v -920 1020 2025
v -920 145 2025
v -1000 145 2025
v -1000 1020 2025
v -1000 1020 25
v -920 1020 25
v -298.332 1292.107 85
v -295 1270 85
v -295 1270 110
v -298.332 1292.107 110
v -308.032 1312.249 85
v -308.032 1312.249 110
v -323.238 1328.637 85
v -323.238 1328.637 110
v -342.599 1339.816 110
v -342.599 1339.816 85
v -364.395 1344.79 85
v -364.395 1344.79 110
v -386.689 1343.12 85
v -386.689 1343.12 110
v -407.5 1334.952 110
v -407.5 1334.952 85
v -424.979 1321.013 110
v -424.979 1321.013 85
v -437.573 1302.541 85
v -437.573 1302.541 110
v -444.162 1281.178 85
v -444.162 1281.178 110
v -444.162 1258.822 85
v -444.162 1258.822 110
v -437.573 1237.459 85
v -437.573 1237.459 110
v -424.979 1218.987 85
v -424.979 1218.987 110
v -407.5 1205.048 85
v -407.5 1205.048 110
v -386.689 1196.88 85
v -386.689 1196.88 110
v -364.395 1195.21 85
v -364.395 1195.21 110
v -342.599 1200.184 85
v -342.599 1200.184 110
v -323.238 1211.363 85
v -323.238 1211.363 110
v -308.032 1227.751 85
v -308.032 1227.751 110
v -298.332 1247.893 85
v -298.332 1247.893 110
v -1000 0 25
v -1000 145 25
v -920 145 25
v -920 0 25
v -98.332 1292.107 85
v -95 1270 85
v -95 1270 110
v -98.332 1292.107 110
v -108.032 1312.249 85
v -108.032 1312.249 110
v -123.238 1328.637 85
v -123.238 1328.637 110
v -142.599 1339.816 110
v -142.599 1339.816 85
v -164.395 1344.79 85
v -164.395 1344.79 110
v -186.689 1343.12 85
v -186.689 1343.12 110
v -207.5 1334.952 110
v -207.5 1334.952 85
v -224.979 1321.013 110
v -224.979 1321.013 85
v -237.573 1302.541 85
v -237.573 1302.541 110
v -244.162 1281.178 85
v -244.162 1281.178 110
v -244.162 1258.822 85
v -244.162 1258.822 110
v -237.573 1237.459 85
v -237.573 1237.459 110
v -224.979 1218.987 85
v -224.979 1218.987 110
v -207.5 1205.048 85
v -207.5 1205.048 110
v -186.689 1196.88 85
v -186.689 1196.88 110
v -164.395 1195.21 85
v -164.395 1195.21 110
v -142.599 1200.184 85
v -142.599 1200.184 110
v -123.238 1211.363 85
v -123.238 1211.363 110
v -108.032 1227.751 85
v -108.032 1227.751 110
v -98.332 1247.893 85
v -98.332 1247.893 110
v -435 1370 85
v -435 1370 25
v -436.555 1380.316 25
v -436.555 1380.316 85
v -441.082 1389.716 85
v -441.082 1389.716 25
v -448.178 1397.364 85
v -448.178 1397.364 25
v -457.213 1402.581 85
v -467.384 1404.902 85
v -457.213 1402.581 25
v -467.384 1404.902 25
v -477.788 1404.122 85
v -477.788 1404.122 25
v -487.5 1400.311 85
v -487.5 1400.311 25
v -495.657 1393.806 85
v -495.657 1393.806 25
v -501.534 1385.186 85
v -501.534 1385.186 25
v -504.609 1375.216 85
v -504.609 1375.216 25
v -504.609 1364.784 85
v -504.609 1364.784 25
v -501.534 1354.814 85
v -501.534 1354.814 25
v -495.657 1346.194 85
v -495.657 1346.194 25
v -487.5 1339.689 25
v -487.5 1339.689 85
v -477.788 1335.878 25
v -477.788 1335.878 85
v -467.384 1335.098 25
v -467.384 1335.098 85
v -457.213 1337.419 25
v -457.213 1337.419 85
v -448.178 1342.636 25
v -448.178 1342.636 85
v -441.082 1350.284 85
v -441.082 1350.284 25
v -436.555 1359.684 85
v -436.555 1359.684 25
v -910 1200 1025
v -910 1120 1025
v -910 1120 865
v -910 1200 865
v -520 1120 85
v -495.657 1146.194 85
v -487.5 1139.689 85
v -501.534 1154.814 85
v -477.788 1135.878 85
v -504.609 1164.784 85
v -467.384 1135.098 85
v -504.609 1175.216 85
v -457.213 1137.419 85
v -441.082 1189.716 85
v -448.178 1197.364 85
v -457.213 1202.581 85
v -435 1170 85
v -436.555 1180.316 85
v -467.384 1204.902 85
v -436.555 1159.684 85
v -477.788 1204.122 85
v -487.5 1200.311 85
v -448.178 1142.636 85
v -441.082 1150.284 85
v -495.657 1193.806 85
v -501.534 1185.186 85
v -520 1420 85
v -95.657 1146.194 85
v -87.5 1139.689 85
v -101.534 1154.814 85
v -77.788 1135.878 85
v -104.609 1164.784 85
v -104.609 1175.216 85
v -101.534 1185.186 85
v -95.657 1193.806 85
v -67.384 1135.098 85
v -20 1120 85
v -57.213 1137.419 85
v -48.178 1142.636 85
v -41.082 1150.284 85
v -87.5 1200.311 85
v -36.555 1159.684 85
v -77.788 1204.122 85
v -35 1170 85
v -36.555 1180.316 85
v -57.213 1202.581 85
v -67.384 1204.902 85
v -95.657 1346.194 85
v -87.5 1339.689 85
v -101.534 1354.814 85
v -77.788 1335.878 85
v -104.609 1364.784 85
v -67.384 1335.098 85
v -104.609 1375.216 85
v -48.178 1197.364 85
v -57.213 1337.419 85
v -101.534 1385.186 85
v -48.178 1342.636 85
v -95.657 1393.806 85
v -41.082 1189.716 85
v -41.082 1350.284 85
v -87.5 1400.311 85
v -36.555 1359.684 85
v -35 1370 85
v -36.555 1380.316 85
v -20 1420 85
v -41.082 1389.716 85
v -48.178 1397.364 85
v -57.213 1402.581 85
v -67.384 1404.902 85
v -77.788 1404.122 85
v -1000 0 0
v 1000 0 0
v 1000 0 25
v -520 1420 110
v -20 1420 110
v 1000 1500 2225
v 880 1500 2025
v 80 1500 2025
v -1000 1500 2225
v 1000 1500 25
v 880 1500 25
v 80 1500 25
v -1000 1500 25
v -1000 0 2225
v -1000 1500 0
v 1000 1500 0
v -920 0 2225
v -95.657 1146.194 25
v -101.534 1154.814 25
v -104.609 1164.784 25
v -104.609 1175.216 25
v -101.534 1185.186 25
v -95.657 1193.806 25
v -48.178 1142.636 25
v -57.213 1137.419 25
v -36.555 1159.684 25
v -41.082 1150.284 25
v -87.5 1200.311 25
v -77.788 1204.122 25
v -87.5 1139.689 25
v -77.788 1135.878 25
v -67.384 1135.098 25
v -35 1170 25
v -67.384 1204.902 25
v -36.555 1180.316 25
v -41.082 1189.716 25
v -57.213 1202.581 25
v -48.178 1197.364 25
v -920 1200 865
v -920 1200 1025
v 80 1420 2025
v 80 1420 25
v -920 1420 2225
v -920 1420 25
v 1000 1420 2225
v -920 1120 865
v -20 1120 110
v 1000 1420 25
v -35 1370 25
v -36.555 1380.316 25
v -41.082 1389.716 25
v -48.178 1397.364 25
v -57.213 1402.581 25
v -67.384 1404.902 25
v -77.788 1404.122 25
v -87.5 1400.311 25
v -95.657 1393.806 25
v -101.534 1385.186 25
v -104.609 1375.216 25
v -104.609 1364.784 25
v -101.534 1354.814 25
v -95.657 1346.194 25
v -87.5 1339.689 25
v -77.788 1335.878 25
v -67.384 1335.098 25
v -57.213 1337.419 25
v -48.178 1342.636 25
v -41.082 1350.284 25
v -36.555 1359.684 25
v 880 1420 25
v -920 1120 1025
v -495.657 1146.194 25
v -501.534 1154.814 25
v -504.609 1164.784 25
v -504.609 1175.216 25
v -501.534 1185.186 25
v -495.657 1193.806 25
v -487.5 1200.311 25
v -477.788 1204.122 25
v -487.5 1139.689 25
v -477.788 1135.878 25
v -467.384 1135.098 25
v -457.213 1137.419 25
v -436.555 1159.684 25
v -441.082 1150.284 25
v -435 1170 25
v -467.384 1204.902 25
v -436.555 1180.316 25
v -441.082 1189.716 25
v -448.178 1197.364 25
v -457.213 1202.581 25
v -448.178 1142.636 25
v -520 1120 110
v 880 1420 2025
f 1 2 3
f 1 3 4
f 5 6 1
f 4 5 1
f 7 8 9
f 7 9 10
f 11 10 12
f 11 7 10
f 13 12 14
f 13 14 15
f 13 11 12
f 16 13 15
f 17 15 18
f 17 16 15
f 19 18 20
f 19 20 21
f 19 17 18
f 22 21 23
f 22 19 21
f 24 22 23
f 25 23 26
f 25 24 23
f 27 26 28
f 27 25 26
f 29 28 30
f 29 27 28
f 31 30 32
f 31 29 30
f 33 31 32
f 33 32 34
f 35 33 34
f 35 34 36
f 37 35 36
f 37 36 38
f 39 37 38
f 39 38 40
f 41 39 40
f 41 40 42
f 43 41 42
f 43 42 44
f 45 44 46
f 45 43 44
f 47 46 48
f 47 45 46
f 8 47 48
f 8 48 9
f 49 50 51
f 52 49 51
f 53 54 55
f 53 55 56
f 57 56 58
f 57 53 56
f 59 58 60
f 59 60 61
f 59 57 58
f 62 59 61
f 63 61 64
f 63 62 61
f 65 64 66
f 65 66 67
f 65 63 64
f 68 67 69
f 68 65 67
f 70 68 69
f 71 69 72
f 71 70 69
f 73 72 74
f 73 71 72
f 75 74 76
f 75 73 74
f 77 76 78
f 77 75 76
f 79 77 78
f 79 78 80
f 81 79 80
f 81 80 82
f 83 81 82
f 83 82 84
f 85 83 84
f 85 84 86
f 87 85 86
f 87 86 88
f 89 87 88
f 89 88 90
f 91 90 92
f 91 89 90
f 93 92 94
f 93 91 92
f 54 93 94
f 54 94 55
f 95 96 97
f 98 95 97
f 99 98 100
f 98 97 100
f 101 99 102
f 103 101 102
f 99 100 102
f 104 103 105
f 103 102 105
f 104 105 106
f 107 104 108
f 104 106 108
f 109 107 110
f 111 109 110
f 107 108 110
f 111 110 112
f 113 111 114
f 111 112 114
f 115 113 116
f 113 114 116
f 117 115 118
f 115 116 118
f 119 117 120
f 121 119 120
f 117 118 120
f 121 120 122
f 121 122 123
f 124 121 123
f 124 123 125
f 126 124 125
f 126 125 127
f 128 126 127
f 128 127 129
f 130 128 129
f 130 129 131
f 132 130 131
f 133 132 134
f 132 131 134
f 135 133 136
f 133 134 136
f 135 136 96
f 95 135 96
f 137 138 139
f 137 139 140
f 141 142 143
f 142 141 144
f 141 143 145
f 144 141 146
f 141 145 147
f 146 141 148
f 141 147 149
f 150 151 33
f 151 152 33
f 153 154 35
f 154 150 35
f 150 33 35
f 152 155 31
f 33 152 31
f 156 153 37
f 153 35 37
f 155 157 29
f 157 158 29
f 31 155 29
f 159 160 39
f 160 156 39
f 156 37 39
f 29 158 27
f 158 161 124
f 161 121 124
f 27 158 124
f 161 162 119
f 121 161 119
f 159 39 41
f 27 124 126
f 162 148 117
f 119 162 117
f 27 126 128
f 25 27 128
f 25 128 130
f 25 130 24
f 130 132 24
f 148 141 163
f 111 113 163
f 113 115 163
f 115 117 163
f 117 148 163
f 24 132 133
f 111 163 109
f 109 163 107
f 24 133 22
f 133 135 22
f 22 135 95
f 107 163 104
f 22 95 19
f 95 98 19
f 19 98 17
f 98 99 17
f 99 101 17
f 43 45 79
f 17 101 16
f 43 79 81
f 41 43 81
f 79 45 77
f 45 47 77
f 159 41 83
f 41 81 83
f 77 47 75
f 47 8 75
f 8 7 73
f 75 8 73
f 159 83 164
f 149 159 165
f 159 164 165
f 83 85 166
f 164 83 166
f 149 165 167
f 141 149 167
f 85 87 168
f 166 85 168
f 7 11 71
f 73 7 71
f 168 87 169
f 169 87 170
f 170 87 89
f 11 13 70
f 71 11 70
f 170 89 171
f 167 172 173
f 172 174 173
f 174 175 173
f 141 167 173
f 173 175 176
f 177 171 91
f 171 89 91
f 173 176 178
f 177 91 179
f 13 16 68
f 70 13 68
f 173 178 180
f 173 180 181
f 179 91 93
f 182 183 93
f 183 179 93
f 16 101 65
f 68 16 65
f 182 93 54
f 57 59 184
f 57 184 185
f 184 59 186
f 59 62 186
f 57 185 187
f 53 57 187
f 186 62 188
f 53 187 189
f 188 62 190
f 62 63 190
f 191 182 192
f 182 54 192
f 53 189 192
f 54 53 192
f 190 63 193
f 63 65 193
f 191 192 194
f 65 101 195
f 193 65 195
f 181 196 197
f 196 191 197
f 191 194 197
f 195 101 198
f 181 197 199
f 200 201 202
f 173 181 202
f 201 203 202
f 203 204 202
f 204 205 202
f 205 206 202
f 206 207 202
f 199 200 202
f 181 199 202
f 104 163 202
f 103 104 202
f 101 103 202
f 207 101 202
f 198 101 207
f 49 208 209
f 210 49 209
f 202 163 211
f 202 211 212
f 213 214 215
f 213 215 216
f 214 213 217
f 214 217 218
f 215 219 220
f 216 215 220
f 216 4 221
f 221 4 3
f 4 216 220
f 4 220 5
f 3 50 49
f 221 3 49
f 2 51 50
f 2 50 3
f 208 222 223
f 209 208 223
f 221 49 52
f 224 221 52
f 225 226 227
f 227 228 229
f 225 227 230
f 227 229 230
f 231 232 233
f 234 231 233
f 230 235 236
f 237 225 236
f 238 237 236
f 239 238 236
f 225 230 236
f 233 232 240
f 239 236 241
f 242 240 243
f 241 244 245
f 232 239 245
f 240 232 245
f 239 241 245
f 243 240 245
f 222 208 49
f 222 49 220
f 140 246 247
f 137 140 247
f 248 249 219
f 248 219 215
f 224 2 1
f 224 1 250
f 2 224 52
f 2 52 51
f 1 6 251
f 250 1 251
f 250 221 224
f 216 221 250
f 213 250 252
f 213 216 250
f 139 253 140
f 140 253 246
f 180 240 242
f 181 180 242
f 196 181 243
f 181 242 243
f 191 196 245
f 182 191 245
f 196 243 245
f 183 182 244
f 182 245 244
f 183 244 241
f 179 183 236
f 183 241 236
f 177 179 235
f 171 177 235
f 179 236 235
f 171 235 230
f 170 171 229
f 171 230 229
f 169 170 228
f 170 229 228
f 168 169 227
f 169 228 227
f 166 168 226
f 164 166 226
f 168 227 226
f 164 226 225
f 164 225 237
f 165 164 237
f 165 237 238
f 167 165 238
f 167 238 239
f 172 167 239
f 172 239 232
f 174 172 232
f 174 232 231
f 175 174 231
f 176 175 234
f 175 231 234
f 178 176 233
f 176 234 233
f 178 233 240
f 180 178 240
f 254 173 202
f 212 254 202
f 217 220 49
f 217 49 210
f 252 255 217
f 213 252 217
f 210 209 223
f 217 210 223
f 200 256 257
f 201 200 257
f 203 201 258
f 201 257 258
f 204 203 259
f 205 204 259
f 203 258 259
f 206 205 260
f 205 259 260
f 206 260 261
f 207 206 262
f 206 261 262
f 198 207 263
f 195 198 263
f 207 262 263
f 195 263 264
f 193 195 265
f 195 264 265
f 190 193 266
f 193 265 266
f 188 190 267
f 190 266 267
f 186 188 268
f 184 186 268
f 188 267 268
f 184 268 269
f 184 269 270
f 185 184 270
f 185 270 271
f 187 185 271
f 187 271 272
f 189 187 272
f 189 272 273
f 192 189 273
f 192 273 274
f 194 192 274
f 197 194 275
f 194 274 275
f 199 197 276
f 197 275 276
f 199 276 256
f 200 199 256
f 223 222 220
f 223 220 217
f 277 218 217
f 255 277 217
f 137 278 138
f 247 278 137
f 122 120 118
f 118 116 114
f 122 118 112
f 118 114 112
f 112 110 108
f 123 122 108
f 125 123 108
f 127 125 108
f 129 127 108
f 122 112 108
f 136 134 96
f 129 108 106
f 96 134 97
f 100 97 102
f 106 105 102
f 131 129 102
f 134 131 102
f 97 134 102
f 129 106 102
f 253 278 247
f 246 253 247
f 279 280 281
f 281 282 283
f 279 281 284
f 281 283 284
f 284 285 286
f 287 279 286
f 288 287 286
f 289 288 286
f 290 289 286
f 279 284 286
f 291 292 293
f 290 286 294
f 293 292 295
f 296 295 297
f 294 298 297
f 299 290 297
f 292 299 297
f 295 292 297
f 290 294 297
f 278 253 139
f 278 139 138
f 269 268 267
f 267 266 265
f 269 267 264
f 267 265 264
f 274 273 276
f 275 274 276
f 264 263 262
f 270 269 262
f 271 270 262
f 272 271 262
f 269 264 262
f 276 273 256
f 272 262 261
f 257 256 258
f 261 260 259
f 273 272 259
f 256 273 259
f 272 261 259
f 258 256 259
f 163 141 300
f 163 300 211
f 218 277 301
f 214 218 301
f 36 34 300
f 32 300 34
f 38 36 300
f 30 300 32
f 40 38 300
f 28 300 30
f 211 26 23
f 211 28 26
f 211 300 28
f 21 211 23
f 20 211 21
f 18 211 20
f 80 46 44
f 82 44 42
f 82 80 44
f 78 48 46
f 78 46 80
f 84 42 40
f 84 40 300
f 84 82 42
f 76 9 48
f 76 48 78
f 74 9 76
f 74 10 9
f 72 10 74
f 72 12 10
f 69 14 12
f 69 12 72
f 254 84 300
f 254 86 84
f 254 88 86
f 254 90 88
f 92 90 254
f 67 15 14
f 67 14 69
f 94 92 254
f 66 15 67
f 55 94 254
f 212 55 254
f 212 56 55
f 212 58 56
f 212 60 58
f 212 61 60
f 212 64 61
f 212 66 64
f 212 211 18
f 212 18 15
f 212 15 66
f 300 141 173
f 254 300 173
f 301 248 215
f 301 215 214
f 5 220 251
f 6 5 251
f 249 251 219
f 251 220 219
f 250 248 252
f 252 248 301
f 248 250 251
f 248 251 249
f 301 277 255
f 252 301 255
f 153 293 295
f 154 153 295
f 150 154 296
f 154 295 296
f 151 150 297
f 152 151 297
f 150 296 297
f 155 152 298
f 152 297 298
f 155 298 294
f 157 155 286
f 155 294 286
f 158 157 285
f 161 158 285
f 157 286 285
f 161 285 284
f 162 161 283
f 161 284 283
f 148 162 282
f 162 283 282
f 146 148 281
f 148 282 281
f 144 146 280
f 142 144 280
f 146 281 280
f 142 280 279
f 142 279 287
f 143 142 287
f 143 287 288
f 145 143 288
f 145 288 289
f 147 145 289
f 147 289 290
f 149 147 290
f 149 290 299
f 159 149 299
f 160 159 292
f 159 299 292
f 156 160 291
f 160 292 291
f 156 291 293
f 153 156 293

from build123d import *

# Parameters (mm, degrees)
F0_W      = 2000
F0_H      = 1500
F1_DEPTH  = 25
F3_DEPTH  = 2200
F4_W      = 875
F4_H      = 2000
F5_DEPTH  = 80.001
F6_W      = 800
F6_H      = 2000
F7_DEPTH  = 80.001
F8_R      = 35
F9_DEPTH  = 60
F10_W     = 500
F10_H     = 300
F10_R     = 75
F11_DEPTH = 25
F12_W     = 80
F12_H     = 160
F13_DEPTH = 10


with BuildPart() as f1:
    # F0 (on Top) → F1 (new body)
    with BuildSketch(Plane.XY):
        with Locations((0, 750)):
            Rectangle(F0_W, F0_H)
    extrude(amount=F1_DEPTH)


with BuildPart() as f3:
    # F2 (on face) → F3 (new body)
    with BuildSketch(Plane.XY.offset(25)):
        Polygon((-1000, 1500), (-1000, 0), (-920, 0), (-920, 1420), (1000, 1420), (1000, 1500), align=None)
    extrude(amount=F3_DEPTH)

    # F4 (on face) → F5 (cut, through all)
    with BuildSketch(Plane.YZ.offset(-920)):
        with Locations((582.5, 1025)):
            Rectangle(F4_W, F4_H)
    extrude(amount=-F5_DEPTH, mode=Mode.SUBTRACT)

    # F6 (on face) → F7 (cut, through all)
    with BuildSketch(Plane.XZ.offset(-1420)):
        with Locations((480, 1025)):
            Rectangle(F6_W, F6_H)
    extrude(amount=-F7_DEPTH, mode=Mode.SUBTRACT)


with BuildPart() as f9:
    # F8 (on face) → F9 (new body)
    with BuildSketch(Plane.XY.offset(25)):
        with Locations((-470, 1370)):
            Circle(F8_R)
    extrude(amount=F9_DEPTH)



with BuildPart() as f9b:
    # F8 (on face) → F9, piece 2 (new body)
    with BuildSketch(Plane.XY.offset(25)):
        with Locations((-470, 1170)):
            Circle(F8_R)
    extrude(amount=F9_DEPTH)


with BuildPart() as f9c:
    # F8 (on face) → F9, piece 3 (new body)
    with BuildSketch(Plane.XY.offset(25)):
        with Locations((-70, 1370)):
            Circle(F8_R)
    extrude(amount=F9_DEPTH)


with BuildPart() as f9d:
    # F8 (on face) → F9, piece 4 (new body)
    with BuildSketch(Plane.XY.offset(25)):
        with Locations((-70, 1170)):
            Circle(F8_R)
    extrude(amount=F9_DEPTH)


with BuildPart() as f9_1:
    add(f9.part)

    add(f9b.part)  # F11 merges F9b

    add(f9c.part)  # F11 merges F9c

    add(f9d.part)  # F11 merges F9d
    # F10 (on face) → F11 (join)
    with BuildSketch(Plane.XY.offset(85)):
        with Locations((-270, 1270)):
            Rectangle(F10_W, F10_H)
        with Locations((-370, 1270)):
            Circle(F10_R, mode=Mode.SUBTRACT)
        with Locations((-170, 1270)):
            Circle(F10_R, mode=Mode.SUBTRACT)
    extrude(amount=F11_DEPTH)


with BuildPart() as f13:
    # F12 (on face) → F13 (new body)
    with BuildSketch(Plane.YZ.offset(-920)):
        with Locations((1160, 945)):
            Rectangle(F12_W, F12_H)
    extrude(amount=F13_DEPTH)


solid = Compound([f1.part, f3.part, f9_1.part, f13.part])
